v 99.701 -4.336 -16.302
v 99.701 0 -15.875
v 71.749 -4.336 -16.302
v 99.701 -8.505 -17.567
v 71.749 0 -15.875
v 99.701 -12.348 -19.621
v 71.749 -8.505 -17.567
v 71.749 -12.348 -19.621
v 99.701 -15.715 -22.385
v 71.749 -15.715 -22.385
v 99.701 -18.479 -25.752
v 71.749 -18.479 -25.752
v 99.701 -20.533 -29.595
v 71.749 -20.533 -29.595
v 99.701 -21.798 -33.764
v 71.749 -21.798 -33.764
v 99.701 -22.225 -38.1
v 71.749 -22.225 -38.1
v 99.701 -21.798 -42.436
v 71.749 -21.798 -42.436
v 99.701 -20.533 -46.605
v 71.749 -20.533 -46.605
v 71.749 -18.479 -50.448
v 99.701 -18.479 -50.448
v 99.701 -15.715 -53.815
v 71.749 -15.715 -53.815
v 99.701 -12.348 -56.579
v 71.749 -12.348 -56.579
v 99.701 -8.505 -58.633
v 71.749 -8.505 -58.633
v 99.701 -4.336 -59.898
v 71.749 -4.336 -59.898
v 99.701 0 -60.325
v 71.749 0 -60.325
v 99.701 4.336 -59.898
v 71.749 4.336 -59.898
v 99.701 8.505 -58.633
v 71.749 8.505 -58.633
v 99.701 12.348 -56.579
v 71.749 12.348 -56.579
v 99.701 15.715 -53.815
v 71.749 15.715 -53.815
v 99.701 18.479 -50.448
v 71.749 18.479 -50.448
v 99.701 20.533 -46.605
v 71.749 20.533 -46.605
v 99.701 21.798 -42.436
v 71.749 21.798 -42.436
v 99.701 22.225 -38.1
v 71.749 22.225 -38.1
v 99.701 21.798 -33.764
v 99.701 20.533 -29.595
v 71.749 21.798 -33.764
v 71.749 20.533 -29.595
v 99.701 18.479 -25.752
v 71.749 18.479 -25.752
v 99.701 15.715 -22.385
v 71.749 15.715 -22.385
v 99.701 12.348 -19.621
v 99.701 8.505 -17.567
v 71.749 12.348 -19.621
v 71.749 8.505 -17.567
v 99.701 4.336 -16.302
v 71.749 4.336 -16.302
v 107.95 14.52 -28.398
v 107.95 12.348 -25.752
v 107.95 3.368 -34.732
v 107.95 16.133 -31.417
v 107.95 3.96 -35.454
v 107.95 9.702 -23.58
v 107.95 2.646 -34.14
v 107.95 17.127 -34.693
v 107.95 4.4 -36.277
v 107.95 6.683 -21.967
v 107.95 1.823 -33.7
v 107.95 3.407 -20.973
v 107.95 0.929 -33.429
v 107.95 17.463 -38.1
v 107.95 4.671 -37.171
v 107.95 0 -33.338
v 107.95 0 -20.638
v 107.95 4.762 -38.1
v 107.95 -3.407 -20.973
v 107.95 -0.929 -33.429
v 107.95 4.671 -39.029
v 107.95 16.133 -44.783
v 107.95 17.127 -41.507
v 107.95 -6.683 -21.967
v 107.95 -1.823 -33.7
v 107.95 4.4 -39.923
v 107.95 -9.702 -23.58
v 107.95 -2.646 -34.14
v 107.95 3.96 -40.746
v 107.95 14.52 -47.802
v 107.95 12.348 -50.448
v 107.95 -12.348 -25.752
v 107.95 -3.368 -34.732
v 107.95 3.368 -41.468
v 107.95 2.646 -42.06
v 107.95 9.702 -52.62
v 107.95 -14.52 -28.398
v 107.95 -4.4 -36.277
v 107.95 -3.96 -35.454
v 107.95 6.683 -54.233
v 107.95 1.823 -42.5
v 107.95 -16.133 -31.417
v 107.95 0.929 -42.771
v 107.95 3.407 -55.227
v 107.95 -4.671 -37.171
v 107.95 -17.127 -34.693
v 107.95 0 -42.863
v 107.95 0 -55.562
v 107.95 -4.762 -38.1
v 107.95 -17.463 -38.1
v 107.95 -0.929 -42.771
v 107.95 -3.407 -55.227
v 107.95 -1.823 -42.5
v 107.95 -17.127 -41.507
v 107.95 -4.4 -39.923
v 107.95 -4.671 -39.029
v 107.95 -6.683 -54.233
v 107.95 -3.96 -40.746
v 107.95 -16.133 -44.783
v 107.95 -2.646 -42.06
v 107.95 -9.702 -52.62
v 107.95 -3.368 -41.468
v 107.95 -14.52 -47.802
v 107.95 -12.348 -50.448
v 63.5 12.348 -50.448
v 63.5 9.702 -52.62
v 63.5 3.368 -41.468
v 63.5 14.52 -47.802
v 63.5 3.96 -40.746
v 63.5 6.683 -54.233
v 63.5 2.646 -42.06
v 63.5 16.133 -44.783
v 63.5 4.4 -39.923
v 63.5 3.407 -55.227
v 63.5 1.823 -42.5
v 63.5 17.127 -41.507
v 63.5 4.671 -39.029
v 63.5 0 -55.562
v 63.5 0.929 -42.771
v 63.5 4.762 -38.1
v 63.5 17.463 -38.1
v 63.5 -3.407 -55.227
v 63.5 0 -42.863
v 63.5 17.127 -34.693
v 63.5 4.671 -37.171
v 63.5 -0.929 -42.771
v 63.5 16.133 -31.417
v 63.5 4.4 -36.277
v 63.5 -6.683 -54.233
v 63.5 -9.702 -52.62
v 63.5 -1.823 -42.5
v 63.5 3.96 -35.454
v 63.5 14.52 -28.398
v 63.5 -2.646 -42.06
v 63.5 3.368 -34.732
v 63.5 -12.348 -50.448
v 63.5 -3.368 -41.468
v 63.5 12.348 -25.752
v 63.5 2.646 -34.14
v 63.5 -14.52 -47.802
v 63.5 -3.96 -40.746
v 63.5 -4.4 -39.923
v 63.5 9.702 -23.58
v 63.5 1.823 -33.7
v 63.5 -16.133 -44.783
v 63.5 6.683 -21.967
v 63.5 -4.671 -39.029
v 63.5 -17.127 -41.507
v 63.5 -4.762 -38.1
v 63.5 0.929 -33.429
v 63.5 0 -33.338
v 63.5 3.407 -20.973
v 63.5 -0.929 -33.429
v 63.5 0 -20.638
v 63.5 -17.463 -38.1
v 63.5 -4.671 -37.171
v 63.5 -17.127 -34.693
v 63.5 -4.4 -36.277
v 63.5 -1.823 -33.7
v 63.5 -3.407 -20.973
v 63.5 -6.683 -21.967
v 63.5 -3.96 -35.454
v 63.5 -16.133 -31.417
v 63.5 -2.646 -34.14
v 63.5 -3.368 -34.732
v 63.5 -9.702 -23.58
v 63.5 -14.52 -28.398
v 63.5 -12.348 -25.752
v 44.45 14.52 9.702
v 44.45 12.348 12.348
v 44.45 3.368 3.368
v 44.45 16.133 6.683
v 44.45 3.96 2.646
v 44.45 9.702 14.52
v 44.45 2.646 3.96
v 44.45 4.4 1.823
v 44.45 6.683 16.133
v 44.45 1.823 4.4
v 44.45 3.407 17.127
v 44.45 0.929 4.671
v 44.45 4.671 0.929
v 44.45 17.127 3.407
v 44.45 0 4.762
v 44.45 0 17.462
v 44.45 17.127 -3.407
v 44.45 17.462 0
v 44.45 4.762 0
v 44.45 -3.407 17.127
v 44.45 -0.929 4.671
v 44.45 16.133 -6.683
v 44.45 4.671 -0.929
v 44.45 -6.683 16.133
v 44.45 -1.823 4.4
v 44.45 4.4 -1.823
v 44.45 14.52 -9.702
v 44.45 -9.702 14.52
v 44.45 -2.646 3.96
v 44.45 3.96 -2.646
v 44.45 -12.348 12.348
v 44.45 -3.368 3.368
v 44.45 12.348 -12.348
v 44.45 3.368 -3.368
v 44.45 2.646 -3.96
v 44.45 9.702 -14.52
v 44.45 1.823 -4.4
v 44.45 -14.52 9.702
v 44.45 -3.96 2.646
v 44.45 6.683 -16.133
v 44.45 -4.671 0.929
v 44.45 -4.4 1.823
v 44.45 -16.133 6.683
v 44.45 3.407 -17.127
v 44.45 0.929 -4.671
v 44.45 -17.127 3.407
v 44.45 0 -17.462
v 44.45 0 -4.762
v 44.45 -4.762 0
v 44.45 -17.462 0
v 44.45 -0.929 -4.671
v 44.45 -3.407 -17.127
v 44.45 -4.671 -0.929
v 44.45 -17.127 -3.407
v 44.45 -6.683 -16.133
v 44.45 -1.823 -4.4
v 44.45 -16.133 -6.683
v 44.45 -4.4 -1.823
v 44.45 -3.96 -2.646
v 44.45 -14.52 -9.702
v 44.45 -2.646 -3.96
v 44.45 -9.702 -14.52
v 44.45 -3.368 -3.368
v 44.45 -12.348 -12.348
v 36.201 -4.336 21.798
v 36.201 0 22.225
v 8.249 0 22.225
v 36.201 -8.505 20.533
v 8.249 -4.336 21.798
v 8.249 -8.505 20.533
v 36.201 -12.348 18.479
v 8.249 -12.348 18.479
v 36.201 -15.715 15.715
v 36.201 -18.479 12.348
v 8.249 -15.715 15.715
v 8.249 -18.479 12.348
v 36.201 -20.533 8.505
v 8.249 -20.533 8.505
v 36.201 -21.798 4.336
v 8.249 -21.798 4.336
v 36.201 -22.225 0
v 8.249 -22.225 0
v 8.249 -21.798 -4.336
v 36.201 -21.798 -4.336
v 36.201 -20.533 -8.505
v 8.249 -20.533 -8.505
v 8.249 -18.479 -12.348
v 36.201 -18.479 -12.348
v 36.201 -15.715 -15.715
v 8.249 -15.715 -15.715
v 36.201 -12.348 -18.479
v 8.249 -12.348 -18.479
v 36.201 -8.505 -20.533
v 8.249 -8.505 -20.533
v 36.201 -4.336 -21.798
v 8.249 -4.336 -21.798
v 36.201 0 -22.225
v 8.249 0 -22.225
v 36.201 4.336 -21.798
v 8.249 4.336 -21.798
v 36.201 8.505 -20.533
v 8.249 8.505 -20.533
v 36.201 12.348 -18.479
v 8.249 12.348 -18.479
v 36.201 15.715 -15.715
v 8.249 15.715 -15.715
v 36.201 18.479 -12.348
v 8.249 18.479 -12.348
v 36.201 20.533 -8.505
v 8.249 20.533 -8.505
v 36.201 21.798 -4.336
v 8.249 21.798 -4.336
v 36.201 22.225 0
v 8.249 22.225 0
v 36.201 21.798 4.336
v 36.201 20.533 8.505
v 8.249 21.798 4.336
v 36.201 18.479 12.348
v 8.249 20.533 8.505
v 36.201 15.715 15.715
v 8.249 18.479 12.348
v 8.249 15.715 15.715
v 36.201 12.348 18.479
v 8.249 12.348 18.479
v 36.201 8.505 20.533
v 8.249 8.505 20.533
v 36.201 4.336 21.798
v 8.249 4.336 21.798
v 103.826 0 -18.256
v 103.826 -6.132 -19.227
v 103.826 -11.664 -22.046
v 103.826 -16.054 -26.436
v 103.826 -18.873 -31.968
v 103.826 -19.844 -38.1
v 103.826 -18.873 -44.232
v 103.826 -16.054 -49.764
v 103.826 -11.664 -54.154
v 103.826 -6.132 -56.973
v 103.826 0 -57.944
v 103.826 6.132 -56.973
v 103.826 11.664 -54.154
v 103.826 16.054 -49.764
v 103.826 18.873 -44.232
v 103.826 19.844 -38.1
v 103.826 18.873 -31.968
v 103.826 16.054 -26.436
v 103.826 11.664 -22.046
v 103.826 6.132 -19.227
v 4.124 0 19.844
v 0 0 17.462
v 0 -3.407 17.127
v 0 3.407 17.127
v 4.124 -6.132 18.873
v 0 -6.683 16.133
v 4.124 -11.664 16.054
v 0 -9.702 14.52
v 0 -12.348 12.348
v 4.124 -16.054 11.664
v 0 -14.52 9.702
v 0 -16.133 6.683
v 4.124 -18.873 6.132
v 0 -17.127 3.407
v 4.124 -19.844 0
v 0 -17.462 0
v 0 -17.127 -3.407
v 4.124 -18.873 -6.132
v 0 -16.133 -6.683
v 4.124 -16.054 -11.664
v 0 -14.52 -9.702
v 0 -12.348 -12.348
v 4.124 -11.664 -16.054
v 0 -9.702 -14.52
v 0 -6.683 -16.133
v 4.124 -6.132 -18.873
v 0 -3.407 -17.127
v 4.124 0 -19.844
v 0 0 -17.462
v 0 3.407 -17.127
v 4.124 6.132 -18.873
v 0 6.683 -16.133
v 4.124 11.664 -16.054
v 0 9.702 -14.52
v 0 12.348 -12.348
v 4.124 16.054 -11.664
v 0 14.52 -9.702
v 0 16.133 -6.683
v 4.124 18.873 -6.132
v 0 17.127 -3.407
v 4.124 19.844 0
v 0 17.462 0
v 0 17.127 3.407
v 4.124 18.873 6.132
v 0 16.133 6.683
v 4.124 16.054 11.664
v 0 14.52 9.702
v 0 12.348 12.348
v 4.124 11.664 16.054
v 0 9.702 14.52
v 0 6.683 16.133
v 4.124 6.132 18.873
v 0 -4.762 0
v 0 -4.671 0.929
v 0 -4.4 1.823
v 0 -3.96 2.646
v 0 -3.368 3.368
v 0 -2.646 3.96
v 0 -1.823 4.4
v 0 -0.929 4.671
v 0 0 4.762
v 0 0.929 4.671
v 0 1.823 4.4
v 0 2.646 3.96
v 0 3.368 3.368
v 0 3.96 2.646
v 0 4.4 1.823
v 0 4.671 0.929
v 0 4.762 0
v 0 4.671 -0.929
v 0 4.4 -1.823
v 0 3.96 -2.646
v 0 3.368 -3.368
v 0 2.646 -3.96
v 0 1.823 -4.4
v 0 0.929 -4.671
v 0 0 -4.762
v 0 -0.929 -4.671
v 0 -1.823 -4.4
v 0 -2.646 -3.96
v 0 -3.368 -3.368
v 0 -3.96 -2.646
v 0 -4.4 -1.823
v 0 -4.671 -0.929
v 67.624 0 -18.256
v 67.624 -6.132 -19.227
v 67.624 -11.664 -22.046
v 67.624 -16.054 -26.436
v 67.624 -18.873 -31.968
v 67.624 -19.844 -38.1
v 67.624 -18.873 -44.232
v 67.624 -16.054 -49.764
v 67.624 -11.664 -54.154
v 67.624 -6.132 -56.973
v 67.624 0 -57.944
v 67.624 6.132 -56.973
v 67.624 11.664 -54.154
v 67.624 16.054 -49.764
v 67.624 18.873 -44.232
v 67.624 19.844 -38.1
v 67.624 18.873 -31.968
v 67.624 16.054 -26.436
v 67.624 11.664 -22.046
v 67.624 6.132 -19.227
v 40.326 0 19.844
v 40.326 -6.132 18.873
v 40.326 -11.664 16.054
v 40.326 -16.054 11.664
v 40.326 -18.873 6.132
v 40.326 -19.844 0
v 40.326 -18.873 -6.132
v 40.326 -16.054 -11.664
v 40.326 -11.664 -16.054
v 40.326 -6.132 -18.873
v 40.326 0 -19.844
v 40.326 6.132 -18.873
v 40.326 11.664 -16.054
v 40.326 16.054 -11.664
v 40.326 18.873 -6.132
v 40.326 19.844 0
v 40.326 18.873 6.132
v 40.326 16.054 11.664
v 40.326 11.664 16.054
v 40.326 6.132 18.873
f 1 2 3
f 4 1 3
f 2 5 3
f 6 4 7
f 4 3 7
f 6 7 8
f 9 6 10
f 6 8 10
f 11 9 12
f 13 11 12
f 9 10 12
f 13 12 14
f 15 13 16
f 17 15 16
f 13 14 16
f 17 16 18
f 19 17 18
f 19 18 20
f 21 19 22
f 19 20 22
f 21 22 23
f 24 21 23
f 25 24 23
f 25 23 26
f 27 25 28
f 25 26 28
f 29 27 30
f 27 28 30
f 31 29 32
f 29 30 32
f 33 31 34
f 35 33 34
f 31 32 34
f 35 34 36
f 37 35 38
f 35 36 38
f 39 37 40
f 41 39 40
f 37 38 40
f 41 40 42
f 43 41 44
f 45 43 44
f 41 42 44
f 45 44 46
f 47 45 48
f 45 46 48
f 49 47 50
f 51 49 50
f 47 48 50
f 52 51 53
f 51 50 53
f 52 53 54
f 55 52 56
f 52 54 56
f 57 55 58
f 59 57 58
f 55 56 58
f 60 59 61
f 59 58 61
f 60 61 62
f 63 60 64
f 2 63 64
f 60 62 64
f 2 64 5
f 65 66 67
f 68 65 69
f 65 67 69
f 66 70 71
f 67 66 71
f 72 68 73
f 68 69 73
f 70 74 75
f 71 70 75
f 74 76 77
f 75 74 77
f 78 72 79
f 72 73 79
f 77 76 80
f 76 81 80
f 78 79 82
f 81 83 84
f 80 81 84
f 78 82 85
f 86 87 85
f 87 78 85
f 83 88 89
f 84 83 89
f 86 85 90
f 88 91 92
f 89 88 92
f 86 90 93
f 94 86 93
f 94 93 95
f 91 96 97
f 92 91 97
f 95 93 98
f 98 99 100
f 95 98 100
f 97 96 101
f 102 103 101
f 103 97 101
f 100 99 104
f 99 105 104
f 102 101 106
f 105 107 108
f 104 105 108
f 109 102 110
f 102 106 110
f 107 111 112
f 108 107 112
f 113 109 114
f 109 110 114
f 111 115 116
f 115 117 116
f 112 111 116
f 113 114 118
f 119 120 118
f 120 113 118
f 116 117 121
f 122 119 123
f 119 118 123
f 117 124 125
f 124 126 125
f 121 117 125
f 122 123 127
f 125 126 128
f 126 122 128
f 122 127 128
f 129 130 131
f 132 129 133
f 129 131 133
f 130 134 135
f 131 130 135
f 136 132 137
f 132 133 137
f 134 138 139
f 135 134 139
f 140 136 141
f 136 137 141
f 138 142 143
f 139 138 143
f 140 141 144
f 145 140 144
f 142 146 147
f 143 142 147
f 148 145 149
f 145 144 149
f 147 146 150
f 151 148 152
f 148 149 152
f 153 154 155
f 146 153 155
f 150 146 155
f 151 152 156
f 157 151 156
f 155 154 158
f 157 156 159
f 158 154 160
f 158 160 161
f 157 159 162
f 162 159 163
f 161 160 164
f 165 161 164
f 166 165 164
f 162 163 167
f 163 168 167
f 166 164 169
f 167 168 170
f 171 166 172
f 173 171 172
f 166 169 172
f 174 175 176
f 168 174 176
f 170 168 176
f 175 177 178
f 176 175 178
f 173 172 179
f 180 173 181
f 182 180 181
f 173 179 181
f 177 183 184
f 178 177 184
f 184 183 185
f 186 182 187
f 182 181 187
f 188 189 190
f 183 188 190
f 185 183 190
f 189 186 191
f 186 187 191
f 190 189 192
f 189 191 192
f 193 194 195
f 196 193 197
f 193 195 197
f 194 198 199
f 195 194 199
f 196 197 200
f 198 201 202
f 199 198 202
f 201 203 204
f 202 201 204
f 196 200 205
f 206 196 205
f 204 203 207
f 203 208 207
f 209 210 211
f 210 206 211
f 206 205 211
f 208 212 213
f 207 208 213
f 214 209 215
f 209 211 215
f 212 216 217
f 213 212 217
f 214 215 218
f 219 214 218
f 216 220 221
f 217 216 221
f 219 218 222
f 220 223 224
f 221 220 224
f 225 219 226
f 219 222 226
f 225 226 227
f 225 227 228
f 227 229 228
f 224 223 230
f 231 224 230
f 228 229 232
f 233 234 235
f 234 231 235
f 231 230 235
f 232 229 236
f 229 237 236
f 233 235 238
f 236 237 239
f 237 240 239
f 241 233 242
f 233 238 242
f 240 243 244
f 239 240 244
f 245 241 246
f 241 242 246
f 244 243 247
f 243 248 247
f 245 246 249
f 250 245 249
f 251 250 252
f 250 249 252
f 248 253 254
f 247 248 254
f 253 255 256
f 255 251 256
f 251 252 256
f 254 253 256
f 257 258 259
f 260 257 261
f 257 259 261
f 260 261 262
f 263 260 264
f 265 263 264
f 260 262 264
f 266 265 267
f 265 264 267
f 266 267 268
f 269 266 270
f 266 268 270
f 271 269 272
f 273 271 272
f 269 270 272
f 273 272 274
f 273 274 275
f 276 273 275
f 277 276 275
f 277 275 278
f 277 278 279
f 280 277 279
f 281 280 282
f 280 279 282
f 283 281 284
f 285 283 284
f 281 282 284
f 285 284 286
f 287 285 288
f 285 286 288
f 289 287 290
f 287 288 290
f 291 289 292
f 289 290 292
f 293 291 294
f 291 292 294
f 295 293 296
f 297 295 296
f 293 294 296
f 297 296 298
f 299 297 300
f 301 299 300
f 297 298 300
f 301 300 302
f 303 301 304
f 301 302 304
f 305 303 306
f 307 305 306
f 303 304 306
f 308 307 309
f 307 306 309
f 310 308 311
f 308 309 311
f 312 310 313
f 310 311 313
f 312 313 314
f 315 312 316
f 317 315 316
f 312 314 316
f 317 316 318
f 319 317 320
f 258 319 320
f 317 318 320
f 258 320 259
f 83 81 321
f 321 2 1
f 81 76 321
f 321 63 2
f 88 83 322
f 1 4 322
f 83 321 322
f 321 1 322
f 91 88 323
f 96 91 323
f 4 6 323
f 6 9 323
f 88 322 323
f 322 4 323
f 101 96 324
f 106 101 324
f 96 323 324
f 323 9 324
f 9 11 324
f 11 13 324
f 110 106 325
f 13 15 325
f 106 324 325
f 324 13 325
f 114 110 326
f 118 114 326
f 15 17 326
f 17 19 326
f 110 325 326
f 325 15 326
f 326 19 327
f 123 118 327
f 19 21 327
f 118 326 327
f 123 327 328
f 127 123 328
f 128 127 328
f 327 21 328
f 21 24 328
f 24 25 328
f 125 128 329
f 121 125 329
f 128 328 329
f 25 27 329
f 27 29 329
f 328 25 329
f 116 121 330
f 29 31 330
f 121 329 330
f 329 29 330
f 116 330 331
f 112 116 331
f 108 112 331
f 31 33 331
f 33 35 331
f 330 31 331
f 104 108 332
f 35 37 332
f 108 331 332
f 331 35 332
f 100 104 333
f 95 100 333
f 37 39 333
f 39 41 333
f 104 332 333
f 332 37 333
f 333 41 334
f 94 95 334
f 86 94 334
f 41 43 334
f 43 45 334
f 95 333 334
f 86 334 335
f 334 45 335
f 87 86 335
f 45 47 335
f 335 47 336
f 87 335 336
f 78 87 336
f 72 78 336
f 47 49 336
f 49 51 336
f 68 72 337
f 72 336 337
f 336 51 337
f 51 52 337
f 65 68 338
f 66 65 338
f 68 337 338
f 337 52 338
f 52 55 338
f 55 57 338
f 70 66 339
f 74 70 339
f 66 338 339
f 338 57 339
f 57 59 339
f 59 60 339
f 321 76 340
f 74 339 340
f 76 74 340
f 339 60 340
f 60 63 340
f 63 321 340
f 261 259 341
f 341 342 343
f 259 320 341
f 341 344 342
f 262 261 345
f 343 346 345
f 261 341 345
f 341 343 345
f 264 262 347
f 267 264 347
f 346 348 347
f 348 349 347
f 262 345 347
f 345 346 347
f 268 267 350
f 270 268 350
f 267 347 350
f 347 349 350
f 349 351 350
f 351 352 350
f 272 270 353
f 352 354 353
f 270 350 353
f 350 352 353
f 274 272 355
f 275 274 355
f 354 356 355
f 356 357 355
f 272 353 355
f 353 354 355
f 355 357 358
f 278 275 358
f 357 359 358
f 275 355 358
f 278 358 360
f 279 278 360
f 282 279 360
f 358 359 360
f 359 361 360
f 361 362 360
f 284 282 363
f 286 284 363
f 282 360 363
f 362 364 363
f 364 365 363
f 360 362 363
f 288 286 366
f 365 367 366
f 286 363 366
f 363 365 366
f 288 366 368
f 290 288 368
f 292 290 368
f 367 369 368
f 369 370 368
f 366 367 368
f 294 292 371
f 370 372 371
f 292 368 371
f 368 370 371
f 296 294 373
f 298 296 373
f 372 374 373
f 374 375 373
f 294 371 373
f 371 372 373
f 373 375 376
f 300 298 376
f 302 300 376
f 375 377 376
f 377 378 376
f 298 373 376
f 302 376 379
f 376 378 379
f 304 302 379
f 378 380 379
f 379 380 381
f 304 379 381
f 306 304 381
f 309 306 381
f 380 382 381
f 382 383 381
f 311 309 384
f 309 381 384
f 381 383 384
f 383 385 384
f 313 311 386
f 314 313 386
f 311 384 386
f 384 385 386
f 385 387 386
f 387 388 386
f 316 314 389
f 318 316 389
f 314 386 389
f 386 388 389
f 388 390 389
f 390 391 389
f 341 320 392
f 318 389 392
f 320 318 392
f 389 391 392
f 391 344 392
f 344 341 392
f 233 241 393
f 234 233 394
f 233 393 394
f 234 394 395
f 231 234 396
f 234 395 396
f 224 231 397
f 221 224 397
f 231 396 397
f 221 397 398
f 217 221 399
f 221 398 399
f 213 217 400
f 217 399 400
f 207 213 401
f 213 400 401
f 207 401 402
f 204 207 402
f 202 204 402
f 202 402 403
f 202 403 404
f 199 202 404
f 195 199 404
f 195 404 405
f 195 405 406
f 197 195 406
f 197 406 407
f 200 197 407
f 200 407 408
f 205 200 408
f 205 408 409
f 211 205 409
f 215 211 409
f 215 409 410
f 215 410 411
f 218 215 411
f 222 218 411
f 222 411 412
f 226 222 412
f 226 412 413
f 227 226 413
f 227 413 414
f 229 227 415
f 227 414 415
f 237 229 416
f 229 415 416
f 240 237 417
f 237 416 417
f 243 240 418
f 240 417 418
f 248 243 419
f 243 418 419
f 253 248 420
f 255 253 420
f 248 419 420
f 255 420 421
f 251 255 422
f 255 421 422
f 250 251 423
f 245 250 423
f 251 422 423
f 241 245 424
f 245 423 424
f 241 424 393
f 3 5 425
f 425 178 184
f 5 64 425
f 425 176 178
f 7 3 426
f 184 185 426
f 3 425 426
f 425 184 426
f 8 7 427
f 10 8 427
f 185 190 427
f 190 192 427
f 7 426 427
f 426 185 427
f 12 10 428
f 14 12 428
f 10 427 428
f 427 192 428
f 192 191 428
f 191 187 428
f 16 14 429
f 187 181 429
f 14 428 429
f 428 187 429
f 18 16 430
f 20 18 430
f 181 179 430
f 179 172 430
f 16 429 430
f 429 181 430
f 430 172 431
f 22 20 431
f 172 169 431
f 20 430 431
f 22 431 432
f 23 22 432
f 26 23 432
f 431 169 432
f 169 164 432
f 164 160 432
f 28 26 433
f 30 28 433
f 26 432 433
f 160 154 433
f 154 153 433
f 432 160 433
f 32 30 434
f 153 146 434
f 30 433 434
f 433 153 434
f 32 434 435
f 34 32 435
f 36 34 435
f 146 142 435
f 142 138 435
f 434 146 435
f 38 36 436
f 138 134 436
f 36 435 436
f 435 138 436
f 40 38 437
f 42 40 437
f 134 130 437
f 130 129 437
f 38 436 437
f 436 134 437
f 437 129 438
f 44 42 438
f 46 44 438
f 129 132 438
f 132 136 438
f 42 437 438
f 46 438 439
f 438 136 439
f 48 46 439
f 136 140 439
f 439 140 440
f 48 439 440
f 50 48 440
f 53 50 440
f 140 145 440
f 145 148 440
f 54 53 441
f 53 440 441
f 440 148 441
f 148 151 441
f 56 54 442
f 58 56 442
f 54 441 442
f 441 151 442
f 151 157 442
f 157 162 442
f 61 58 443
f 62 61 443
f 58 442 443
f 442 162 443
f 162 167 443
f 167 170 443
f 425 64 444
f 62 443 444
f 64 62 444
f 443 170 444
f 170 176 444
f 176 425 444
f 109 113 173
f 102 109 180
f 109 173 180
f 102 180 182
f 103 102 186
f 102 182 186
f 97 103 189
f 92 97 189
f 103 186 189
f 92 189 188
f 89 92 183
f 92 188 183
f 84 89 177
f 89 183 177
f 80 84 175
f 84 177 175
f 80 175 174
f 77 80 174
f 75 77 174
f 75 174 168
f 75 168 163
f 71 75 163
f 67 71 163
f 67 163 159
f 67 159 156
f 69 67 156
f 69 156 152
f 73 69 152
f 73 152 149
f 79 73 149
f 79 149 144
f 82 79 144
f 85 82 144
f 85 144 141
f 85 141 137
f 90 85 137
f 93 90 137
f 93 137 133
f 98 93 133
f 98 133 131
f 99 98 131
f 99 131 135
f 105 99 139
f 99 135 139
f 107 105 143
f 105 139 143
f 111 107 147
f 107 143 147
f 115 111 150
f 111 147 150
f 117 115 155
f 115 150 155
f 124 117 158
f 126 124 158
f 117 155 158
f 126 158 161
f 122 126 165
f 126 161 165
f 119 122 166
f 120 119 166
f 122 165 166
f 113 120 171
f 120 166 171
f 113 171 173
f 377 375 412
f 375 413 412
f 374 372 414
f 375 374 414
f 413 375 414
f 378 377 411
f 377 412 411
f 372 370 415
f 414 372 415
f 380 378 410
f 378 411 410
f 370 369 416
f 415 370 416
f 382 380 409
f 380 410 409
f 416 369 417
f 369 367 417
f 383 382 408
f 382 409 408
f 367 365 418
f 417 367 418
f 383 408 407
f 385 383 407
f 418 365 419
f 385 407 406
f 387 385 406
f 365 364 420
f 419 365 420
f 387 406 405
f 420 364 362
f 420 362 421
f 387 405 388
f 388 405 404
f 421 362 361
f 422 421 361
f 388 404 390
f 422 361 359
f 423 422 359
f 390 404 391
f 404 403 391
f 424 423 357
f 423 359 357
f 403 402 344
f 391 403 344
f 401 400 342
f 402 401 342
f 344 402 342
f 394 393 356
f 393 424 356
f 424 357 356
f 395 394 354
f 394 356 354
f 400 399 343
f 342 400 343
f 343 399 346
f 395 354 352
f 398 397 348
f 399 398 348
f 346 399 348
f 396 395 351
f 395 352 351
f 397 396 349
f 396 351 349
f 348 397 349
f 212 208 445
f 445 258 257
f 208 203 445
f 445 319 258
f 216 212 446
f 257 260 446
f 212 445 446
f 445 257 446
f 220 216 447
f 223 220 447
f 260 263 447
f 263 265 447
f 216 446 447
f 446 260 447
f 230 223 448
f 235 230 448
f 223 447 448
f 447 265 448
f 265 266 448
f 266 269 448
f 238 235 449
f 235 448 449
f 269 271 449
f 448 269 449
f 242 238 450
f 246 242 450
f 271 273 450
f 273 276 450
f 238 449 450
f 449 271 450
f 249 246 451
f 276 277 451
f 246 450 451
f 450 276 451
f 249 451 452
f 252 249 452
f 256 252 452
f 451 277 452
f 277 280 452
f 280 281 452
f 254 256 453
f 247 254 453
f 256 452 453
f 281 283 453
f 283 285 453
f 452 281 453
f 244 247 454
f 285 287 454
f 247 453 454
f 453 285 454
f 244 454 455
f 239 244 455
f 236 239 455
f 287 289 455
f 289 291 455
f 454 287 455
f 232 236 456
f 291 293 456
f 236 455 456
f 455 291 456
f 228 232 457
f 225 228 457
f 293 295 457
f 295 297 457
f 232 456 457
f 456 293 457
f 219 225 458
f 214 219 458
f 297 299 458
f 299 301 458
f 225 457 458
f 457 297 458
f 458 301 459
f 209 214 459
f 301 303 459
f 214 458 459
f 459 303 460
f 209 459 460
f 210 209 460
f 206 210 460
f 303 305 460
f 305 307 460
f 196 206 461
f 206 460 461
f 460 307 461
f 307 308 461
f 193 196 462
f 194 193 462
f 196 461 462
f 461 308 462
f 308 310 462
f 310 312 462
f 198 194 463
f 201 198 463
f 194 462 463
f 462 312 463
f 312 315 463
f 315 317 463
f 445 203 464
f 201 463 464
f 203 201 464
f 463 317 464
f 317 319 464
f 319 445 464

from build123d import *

# Parameters (mm, degrees)
F3_R     = 4.7625
F4_DEPTH = 107.951


with BuildPart() as f1:
    # F0 (on Front) → F1 (revolve)
    with BuildSketch(Plane.XZ):
        Polygon((0, 17.4625), (0, 0), (44.45, 0), (44.45, 17.4625), (36.201108, 22.225), (8.248892, 22.225), align=None)
    revolve(axis=Axis((22.225, 0, 0), (1, 0, 0)))


with BuildPart() as f2:
    # F0 (on Front) → F2 (revolve)
    with BuildSketch(Plane.XZ):
        Polygon((63.5, -20.6375), (63.5, -38.1), (107.95, -38.1), (107.95, -20.6375), (99.701108, -15.875), (71.748892, -15.875), align=None)
    revolve(axis=Axis((85.725, 0, -38.1), (1, 0, 0)))


with BuildPart() as f4_tool:
    # F3 (on face) → F4 (new body, through all)
    with BuildSketch(Plane(origin=(0, 0, 0), x_dir=(0, -1, 0), z_dir=(-1, 0, 0))):
        Circle(F3_R)
        with Locations((0, -38.1)):
            Circle(F3_R)
    extrude(amount=-F4_DEPTH)


with BuildPart() as f1_1:
    add(f1.part)

    # F4: cut by f4_tool
    add(f4_tool.part, mode=Mode.SUBTRACT)


with BuildPart() as f2_1:
    add(f2.part)

    # F4: cut by f4_tool
    add(f4_tool.part, mode=Mode.SUBTRACT)


solid = Compound([f1_1.part, f2_1.part])
